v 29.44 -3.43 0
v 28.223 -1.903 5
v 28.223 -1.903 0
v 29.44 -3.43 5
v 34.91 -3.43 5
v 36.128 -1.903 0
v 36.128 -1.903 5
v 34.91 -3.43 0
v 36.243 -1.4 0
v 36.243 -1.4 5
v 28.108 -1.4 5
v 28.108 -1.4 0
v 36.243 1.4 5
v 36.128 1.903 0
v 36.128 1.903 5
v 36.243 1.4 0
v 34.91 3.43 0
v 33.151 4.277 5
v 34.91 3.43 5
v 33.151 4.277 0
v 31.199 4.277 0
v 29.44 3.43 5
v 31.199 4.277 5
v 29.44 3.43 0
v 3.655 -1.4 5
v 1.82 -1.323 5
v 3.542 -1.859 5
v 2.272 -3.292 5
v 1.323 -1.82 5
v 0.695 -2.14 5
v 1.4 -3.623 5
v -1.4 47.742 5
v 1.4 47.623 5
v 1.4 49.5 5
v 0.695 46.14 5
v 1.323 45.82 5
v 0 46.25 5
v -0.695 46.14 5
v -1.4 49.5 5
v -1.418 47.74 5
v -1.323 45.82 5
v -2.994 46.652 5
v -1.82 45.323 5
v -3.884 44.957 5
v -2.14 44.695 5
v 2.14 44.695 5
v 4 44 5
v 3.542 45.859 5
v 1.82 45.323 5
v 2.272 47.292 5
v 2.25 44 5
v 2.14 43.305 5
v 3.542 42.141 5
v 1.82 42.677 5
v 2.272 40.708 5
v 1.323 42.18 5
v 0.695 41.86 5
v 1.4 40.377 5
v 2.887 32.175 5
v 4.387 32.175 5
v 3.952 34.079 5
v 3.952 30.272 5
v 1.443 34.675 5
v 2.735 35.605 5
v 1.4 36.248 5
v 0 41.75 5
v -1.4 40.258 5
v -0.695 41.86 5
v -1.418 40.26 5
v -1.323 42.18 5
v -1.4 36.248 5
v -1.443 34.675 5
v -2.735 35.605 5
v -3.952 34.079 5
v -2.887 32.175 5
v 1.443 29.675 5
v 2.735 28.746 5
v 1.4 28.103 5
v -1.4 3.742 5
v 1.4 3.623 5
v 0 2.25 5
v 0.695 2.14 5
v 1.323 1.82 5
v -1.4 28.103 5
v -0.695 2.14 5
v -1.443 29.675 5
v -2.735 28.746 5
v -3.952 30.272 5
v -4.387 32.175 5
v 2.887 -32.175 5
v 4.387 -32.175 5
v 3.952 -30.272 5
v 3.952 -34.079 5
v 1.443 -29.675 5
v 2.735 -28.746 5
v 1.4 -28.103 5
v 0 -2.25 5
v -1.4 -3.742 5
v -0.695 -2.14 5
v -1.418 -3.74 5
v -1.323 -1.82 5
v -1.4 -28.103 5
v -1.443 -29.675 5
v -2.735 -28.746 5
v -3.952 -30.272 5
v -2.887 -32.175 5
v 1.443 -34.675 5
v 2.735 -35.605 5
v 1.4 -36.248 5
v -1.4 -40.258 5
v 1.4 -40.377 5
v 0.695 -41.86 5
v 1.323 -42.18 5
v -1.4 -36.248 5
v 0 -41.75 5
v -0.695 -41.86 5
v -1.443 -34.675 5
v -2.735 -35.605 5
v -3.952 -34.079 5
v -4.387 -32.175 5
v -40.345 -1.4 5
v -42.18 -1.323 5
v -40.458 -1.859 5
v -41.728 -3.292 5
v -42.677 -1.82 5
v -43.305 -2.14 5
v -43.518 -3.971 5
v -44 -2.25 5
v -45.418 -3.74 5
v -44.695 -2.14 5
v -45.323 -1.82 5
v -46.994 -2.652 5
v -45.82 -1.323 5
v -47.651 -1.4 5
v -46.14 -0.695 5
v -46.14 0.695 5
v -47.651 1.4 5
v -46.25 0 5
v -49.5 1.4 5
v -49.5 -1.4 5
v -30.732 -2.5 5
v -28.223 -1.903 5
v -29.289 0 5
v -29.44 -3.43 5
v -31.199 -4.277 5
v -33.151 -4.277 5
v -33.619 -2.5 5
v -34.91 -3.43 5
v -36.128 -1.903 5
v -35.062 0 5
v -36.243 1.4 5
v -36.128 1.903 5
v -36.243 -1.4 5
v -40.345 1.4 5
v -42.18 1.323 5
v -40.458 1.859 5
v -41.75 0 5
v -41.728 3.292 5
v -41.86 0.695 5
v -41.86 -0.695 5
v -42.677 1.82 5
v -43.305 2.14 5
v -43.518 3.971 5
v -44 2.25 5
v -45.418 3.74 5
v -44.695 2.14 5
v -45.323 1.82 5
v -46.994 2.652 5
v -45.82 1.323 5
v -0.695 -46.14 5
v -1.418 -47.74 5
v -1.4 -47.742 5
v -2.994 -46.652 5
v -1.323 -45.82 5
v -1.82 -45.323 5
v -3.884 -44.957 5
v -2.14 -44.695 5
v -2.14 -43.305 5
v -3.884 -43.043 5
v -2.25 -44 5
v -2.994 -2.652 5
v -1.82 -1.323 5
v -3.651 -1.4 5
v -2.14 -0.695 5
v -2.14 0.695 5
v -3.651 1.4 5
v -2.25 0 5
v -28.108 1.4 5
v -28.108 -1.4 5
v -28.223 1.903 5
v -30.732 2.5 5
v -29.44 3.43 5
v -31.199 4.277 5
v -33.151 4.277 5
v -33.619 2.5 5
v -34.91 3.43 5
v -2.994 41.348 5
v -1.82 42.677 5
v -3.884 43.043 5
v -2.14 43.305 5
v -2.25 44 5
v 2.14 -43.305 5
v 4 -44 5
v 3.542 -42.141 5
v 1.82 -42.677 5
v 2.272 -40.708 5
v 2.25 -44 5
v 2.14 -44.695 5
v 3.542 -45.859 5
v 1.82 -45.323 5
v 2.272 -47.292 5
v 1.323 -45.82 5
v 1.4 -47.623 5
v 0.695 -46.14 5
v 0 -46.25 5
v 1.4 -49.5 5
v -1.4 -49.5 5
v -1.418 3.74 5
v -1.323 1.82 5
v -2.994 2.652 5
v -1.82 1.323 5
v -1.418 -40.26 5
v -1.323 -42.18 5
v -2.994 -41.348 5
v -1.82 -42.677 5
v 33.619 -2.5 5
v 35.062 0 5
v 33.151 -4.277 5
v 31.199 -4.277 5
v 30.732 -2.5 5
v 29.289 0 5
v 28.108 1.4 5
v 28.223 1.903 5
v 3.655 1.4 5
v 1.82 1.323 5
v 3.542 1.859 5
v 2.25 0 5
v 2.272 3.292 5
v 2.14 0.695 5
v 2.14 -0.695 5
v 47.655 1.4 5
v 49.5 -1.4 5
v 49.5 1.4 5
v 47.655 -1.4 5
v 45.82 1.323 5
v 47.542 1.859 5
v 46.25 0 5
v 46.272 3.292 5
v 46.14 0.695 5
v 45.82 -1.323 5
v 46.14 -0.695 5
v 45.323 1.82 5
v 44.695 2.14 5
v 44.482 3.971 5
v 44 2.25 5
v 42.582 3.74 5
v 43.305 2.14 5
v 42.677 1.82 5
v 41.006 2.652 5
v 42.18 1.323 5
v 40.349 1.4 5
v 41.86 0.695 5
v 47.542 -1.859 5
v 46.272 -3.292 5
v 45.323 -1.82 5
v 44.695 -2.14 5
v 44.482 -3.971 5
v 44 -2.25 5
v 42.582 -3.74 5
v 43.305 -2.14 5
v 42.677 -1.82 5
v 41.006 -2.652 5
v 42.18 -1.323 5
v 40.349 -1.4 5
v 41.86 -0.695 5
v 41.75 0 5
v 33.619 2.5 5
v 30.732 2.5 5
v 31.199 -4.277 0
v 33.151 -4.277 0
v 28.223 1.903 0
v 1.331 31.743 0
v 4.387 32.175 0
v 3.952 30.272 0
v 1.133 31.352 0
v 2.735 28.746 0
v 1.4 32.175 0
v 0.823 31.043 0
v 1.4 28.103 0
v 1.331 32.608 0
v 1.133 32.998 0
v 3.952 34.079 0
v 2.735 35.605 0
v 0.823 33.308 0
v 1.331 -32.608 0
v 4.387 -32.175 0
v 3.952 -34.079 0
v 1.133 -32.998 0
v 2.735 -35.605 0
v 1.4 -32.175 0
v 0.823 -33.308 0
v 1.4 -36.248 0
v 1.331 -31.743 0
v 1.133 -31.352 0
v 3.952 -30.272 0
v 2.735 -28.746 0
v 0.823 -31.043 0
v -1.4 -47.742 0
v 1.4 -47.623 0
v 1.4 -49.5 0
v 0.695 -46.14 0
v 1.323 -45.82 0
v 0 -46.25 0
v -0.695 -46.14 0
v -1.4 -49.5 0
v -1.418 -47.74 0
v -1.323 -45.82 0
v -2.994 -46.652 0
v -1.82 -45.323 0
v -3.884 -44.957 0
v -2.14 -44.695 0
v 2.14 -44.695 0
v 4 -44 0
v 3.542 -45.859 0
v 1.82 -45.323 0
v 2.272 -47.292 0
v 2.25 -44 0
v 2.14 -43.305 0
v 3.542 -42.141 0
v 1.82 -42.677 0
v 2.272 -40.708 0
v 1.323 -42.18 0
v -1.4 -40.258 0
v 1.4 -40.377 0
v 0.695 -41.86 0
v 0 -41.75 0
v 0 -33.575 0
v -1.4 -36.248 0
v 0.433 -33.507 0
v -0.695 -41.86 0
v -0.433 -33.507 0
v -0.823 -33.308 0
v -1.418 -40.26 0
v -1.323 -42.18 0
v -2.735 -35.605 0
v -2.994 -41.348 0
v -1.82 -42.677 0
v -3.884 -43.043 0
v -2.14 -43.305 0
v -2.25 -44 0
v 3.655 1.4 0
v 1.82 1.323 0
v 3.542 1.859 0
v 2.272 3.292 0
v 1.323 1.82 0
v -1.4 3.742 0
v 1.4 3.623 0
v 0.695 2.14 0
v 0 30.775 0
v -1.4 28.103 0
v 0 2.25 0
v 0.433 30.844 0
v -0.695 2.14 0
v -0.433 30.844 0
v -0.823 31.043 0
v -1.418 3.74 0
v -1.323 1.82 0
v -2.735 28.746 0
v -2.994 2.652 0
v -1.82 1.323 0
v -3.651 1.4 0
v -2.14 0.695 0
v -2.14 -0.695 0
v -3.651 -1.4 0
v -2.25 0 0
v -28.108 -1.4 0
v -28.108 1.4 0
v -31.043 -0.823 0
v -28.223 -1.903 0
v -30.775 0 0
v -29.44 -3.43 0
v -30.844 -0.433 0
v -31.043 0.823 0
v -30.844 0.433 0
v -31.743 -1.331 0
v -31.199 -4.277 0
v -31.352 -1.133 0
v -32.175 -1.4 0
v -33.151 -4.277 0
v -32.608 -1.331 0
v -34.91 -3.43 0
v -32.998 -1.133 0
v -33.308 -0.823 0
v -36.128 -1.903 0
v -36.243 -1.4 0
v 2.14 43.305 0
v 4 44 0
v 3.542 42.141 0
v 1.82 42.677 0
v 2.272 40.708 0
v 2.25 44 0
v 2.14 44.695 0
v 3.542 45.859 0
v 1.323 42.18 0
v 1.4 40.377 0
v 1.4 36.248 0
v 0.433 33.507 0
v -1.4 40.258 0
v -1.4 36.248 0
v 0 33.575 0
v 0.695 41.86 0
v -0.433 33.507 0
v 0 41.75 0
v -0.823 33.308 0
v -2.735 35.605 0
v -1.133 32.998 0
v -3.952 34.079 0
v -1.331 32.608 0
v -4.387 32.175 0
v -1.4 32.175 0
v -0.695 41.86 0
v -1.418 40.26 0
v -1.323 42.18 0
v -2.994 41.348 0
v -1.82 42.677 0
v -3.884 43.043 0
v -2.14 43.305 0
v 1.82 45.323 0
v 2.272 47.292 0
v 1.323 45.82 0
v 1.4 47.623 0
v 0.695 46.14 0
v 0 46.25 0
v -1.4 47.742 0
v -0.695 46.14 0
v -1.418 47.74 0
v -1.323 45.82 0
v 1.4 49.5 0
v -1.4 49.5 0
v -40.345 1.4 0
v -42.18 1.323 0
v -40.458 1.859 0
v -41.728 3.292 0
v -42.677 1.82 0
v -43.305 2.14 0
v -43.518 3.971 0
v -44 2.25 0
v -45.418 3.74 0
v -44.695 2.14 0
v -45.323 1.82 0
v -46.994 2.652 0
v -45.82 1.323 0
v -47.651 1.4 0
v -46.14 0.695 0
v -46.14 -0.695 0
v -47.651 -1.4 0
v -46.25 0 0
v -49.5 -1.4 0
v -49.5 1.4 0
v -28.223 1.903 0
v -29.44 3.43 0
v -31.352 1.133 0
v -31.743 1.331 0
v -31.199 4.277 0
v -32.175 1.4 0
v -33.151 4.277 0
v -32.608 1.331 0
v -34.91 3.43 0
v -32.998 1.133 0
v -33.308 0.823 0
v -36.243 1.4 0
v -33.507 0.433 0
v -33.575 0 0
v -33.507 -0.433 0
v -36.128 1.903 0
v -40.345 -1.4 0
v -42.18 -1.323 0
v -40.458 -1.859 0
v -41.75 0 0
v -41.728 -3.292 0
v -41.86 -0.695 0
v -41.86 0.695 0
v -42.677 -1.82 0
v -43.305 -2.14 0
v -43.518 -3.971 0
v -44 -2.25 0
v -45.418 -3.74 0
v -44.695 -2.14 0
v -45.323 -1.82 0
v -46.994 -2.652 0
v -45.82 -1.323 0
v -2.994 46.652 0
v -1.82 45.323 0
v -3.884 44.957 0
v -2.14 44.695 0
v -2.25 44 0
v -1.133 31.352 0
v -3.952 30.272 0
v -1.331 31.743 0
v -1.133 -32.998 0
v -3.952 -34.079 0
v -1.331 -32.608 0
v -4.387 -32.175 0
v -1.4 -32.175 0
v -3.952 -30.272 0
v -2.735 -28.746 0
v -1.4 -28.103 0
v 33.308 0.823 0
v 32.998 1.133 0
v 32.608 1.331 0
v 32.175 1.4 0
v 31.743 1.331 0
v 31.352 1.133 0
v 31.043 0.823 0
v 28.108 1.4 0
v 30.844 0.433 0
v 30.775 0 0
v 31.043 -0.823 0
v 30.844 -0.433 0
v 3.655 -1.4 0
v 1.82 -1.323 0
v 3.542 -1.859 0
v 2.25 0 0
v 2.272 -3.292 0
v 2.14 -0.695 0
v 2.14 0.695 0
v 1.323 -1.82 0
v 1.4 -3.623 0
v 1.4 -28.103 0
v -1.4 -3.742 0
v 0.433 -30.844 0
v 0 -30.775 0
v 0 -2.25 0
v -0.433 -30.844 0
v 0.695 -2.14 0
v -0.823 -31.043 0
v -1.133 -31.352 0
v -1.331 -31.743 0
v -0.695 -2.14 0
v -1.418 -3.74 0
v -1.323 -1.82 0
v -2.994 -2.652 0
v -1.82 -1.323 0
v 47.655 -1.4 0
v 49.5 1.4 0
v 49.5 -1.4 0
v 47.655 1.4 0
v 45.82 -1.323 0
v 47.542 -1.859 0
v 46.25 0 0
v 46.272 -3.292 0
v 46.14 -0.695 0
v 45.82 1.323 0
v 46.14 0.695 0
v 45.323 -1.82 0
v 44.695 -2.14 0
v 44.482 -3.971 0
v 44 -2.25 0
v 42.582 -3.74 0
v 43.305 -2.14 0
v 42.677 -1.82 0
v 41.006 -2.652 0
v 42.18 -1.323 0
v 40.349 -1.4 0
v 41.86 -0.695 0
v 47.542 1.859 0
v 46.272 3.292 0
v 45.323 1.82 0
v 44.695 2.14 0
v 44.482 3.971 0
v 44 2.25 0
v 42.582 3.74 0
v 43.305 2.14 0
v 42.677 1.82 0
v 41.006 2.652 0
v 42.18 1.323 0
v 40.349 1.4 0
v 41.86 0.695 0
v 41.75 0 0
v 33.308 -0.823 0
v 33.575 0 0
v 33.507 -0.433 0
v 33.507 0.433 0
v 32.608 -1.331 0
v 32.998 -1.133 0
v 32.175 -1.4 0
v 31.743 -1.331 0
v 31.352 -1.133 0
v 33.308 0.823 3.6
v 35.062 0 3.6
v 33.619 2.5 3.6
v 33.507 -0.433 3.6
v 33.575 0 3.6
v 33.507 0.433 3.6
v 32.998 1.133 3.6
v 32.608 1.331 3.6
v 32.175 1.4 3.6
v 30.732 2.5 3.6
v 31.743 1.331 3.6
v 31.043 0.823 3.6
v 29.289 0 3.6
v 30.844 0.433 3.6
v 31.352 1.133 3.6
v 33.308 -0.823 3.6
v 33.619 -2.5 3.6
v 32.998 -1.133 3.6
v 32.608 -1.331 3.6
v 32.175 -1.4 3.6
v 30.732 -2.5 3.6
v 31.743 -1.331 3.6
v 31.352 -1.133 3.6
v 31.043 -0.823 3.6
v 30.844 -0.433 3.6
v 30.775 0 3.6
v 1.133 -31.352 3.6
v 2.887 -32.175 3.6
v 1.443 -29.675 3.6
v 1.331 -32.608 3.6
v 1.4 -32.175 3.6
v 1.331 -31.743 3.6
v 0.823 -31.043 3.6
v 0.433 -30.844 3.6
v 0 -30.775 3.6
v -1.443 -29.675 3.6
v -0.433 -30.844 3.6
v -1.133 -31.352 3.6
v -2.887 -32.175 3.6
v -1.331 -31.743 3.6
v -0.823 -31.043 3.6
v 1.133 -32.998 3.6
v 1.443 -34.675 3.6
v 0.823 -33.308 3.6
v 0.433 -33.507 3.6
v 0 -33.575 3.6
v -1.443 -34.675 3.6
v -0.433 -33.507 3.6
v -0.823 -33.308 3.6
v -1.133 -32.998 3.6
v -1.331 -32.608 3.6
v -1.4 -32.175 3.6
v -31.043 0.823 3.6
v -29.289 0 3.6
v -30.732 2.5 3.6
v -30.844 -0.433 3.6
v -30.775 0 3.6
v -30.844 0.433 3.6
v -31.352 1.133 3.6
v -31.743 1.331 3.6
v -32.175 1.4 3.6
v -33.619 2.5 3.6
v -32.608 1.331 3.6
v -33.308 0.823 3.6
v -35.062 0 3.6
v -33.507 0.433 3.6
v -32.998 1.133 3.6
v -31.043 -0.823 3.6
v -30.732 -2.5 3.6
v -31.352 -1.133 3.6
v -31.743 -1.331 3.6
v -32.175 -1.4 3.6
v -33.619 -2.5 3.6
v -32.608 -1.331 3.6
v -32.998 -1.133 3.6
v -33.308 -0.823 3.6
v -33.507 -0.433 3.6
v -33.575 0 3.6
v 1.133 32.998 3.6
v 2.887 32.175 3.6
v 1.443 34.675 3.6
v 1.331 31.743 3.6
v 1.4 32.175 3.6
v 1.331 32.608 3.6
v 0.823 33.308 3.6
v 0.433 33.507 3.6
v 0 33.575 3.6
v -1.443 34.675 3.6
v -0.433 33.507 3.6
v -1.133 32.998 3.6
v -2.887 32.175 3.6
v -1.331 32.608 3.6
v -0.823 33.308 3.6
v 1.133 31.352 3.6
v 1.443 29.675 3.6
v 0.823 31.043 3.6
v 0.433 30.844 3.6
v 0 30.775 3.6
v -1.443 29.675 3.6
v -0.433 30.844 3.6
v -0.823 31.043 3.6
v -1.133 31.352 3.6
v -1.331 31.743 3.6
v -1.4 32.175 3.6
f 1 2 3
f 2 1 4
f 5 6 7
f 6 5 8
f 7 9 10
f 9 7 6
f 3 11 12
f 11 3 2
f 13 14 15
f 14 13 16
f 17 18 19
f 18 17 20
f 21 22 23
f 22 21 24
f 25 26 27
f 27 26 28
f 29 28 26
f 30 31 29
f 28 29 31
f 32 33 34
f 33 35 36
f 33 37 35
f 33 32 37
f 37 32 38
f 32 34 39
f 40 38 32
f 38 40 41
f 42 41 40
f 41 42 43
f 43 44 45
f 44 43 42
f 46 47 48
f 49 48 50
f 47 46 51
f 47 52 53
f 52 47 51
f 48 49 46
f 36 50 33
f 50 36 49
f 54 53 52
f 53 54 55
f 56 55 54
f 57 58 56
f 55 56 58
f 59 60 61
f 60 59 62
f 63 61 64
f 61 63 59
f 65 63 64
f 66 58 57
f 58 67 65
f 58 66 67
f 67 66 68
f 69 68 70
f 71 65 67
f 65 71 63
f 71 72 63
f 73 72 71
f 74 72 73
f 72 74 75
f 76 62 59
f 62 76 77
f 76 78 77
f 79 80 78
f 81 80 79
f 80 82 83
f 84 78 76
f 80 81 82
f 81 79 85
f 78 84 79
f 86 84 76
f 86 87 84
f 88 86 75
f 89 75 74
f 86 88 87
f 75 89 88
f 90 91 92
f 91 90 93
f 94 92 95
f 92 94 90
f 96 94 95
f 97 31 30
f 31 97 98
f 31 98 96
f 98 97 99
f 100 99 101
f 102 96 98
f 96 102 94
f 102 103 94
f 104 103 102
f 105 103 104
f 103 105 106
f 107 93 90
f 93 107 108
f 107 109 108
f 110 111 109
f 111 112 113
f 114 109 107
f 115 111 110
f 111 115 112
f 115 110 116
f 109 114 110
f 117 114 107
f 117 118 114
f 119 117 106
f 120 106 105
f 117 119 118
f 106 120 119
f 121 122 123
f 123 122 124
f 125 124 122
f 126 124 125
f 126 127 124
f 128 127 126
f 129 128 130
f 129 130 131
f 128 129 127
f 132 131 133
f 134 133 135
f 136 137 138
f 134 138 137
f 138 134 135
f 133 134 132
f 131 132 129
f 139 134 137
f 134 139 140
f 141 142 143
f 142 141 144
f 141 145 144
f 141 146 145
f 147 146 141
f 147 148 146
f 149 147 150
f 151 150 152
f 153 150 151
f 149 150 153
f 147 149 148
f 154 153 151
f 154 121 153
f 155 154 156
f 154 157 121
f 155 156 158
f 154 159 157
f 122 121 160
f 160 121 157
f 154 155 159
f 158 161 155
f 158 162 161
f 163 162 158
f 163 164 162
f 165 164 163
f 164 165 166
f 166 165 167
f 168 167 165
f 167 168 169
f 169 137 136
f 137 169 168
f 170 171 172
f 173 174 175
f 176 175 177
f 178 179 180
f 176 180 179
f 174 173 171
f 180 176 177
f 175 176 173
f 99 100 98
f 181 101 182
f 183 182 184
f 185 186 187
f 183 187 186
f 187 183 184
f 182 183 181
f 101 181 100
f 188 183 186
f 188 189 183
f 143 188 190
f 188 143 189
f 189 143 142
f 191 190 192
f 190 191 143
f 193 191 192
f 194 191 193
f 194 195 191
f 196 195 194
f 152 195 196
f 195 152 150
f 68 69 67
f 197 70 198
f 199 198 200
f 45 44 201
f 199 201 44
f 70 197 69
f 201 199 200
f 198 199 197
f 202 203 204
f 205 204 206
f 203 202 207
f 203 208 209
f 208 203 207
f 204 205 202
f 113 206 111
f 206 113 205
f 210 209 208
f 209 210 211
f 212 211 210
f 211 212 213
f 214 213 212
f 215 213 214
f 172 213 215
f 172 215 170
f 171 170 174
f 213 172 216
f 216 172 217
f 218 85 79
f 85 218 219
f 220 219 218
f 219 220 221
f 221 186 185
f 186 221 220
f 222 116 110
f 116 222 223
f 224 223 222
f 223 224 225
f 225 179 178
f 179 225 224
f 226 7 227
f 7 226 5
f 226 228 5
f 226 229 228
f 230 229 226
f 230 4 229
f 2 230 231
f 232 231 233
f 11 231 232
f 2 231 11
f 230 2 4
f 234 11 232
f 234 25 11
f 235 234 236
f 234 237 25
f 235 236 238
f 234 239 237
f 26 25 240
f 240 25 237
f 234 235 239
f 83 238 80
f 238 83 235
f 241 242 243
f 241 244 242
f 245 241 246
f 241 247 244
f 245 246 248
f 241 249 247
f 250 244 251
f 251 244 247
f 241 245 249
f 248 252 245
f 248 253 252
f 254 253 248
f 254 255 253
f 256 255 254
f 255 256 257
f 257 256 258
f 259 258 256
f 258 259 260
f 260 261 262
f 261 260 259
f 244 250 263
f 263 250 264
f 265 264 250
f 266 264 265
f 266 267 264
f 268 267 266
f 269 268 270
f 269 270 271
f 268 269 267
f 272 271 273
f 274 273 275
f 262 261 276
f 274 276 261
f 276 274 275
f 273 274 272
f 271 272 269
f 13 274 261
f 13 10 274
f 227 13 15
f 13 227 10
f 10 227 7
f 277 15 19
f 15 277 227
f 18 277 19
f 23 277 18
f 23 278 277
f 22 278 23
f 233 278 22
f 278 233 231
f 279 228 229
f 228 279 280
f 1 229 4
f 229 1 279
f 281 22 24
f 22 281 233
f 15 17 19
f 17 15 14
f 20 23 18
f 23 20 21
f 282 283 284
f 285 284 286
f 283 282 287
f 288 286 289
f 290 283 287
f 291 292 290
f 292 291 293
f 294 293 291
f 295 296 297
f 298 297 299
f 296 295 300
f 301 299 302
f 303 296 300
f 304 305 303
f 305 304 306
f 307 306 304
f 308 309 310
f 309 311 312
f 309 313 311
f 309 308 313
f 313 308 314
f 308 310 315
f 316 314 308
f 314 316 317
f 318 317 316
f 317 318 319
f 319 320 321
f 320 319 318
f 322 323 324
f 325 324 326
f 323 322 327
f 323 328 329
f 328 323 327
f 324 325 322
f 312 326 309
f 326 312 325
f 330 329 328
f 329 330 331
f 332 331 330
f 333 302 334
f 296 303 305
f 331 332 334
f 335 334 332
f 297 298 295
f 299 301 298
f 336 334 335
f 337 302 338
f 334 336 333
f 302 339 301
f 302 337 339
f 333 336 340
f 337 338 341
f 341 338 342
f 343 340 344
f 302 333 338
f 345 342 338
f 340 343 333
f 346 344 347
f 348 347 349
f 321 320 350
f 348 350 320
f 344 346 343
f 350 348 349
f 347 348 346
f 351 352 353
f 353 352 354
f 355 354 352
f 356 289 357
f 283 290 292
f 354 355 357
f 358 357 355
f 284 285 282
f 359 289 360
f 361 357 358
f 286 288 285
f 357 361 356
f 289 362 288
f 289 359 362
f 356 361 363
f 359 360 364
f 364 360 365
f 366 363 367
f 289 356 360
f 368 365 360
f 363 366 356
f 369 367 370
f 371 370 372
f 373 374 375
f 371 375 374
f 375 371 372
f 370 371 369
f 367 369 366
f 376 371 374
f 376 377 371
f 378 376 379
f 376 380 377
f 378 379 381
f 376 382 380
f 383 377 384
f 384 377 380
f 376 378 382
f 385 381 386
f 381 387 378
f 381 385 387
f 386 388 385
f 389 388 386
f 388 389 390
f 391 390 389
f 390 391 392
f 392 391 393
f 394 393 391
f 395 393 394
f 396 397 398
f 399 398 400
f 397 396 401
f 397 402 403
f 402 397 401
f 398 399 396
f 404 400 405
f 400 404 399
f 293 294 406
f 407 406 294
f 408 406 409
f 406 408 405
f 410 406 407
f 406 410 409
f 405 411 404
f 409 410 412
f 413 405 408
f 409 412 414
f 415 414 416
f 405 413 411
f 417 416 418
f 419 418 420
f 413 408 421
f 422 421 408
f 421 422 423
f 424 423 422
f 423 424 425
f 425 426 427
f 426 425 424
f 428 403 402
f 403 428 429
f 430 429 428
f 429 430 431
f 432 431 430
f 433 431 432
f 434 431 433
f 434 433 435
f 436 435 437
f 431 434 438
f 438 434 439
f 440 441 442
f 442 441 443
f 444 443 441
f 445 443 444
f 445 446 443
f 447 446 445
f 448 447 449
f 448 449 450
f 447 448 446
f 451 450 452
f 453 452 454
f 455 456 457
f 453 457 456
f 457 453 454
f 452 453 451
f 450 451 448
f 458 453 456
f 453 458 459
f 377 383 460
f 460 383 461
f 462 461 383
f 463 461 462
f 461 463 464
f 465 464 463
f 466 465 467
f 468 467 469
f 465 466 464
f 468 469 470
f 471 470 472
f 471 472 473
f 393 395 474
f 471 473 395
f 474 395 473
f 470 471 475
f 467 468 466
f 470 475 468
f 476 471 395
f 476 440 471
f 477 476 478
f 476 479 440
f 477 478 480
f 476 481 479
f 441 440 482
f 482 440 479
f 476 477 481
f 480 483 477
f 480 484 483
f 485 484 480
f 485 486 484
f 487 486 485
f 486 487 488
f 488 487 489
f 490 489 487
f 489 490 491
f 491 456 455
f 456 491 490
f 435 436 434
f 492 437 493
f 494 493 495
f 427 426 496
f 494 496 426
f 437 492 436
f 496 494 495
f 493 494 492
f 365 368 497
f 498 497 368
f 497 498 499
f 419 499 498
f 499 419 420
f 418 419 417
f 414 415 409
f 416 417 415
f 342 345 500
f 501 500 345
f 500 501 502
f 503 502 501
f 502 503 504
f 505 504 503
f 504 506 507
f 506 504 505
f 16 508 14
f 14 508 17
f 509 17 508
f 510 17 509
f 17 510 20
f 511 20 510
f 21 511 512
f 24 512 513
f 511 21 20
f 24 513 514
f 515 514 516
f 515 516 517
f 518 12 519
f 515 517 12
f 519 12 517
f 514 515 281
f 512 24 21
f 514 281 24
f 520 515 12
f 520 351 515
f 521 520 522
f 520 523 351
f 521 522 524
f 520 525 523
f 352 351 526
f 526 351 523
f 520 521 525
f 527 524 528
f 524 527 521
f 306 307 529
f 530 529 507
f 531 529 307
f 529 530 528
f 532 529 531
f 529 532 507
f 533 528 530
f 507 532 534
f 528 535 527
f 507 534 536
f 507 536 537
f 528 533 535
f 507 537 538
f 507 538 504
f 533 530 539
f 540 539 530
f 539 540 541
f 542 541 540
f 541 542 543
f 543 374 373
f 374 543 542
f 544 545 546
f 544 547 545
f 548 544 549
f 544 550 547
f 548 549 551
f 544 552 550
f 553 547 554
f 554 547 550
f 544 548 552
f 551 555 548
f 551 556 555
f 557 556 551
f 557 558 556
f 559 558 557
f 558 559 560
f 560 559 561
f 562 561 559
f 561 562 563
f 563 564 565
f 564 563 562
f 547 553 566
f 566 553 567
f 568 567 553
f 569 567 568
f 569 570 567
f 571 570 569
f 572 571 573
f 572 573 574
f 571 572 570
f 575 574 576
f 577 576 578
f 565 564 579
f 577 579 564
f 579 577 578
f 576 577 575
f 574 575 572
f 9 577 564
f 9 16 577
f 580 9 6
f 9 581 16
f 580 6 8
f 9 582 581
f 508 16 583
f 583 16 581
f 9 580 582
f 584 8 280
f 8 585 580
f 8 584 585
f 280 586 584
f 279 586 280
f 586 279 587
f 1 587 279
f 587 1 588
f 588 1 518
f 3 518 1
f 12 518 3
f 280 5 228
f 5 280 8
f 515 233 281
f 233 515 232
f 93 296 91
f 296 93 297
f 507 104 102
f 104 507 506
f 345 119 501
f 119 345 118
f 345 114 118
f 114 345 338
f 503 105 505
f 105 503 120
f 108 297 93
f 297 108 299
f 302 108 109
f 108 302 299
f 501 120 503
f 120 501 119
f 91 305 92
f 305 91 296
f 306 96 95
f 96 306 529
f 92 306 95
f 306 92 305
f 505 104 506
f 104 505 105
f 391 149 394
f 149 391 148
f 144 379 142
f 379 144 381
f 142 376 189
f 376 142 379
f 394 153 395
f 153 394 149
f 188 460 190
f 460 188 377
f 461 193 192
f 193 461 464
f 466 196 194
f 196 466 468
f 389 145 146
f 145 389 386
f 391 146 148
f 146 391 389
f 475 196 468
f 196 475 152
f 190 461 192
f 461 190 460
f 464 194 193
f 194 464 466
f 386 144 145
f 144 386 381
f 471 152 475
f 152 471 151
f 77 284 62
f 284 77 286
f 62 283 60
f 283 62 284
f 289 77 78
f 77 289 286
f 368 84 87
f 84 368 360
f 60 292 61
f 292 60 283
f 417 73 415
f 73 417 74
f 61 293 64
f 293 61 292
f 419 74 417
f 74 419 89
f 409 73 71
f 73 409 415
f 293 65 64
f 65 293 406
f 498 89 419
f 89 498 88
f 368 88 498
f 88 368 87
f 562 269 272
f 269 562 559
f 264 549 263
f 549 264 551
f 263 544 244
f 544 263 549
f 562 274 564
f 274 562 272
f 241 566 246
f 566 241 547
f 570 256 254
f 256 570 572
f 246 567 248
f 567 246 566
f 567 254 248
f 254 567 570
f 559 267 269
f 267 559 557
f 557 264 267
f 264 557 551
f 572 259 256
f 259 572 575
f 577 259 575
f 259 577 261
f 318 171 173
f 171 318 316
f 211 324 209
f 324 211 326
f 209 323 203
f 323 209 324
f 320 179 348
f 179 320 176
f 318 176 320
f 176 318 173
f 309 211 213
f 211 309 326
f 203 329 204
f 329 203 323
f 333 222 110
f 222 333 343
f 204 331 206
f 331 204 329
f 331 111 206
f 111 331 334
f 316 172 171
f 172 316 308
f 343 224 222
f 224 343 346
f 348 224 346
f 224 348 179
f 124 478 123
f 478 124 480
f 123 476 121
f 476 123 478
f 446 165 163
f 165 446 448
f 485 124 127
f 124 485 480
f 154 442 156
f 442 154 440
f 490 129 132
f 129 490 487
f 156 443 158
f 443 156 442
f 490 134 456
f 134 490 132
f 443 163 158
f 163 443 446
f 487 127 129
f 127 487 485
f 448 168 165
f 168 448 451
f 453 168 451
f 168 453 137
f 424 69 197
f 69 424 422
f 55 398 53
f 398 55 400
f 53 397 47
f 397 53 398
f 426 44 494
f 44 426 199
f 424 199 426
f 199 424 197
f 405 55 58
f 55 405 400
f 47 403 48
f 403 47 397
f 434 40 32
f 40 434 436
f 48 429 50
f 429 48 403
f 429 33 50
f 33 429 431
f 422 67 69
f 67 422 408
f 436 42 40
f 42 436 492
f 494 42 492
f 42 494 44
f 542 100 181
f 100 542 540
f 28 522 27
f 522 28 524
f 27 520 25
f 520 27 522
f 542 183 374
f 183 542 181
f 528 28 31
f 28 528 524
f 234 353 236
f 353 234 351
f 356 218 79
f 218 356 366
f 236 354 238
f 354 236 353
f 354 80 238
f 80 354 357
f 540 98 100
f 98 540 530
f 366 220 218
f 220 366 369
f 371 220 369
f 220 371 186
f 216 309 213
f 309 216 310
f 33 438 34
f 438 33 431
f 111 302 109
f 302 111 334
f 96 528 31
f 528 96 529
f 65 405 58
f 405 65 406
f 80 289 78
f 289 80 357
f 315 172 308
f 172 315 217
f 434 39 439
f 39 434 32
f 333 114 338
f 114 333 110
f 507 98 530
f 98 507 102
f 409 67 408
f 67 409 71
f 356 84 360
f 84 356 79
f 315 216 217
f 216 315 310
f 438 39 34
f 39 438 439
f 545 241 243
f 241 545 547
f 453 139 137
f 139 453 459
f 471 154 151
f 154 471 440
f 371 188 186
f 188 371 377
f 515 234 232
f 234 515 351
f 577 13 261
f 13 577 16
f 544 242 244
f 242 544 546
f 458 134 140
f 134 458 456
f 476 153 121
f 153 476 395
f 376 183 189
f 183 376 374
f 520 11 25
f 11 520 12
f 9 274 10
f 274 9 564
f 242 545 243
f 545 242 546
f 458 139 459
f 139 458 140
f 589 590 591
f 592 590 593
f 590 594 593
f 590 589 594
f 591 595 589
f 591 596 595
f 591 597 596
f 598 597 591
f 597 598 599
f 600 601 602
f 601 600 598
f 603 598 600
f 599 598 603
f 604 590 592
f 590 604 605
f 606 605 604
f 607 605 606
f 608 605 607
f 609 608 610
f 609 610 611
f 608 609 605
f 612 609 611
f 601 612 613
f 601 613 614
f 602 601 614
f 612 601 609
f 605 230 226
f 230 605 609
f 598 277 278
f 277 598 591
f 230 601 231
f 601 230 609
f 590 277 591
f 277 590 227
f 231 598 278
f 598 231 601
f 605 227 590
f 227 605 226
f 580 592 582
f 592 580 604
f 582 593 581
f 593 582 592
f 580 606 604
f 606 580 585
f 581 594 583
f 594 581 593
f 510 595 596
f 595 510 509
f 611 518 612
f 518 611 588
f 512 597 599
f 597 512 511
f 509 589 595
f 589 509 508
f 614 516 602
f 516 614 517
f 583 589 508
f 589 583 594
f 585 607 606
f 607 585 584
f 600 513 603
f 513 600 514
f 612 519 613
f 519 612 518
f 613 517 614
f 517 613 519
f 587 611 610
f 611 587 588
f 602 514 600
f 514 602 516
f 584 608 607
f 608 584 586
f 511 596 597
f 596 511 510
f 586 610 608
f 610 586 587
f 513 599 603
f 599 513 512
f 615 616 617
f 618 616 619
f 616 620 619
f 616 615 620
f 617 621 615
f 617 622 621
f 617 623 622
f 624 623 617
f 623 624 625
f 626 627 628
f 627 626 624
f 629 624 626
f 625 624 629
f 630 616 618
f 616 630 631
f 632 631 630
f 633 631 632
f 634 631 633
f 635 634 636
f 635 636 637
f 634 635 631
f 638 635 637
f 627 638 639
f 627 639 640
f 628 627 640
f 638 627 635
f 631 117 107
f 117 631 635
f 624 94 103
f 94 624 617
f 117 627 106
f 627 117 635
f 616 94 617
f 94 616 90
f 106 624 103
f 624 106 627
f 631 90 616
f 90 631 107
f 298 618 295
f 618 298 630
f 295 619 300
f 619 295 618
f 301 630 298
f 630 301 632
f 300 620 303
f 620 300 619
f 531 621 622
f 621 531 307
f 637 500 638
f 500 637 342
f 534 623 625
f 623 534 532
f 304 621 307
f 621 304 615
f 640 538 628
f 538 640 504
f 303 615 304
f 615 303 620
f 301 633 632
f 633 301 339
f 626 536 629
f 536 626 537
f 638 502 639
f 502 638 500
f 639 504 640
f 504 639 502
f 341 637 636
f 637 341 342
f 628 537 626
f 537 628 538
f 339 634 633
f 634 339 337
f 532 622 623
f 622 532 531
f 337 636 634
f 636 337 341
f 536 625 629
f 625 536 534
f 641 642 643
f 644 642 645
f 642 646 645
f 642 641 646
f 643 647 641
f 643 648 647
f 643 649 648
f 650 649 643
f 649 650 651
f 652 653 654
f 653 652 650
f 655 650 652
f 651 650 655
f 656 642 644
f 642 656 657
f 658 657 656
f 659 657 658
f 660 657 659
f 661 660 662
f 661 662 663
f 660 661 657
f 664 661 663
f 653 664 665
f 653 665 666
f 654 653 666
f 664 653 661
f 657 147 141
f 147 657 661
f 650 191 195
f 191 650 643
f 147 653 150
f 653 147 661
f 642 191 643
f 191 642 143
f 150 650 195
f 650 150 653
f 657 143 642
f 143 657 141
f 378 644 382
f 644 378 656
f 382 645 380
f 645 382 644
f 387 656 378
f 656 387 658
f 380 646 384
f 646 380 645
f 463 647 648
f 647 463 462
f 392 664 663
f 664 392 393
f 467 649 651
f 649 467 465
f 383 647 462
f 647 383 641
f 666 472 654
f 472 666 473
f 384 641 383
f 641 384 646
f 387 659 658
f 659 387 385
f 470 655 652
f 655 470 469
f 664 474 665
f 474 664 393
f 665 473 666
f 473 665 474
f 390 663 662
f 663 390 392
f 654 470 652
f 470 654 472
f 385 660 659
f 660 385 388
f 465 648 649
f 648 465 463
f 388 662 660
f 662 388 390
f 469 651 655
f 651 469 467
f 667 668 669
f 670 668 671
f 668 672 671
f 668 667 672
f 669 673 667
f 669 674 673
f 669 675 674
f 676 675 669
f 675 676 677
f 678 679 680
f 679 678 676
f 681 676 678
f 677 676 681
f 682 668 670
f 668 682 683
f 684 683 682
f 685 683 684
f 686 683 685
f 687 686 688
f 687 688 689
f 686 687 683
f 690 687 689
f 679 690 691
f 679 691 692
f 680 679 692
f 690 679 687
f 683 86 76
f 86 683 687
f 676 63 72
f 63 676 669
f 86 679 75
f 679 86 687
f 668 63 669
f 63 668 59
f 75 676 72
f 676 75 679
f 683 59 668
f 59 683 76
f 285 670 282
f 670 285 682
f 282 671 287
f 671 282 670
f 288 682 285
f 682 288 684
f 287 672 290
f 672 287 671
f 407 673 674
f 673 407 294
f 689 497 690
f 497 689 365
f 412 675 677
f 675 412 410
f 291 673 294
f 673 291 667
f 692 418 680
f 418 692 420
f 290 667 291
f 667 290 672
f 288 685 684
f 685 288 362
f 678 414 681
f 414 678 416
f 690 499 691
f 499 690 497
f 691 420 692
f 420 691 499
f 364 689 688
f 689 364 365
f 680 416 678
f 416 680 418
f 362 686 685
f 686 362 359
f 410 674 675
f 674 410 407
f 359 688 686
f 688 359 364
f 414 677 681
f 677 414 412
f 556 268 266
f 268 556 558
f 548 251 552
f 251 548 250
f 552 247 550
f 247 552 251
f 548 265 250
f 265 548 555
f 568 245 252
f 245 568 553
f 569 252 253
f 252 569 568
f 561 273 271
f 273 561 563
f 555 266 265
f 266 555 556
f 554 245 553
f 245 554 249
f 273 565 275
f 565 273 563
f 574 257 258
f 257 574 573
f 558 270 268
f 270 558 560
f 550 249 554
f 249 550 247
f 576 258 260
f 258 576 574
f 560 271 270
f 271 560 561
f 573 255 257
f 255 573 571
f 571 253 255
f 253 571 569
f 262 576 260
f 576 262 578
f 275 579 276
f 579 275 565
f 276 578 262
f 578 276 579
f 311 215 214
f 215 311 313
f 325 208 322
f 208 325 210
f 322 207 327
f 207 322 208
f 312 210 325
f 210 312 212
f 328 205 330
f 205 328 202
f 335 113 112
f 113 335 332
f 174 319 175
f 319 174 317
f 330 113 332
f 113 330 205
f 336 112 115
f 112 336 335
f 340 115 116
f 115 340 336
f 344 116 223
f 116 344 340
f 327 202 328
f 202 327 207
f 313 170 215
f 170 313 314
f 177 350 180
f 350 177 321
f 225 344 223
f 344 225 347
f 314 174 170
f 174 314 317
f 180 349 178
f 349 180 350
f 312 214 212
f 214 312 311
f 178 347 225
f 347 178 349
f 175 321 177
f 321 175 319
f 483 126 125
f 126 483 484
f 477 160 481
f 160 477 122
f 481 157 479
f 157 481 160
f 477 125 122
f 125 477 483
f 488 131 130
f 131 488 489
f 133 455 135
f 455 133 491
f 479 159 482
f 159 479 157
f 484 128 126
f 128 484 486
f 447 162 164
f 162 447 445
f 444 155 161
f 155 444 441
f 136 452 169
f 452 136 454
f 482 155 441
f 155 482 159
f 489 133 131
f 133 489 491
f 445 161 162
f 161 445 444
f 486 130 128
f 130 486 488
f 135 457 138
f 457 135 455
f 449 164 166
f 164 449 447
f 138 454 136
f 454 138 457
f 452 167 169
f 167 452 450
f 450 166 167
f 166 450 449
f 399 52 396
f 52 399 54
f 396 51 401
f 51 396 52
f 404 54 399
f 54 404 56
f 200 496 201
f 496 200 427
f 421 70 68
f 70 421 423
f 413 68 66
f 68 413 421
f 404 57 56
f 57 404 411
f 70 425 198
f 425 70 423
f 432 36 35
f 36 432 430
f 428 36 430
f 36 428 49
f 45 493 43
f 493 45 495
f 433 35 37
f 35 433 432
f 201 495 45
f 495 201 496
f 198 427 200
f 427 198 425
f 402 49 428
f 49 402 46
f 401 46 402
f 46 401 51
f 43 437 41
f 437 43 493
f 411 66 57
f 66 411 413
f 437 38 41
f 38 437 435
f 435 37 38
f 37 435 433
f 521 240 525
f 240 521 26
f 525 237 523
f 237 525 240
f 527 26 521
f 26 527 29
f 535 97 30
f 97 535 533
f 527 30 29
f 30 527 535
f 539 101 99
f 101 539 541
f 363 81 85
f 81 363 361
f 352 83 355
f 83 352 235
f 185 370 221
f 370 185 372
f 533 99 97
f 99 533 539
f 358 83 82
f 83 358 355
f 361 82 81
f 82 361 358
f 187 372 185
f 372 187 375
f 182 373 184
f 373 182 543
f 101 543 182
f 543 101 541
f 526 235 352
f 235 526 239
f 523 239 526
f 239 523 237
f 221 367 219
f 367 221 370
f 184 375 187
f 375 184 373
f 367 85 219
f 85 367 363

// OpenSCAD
module
hexagon (d, height)
// D is the distance between two oppisite vertices on the hexagon
{
   D = d * 2 / sqrt(3);
   t = D / 2;
  
  for (r =[0, 60, 120])
    rotate ([0, 0, r]) cube ([t, d, height], true);
}


nutd = 5;
nutHeight = 2.8;

thickness = 5;
studDiameter = nutd * 2 / sqrt(3) + 3;
holeDiameter = 2.8;
braceWidth = holeDiameter;

mountDiameter = 8;
mountHoleDiameter = 4.5;



offsetX = 46;
offsetY = 45;

diagonalBoard= sqrt(pow(offsetX, 2) + pow(offsetY, 2));
diagonalBeam = 99;

//diagonalMount = diagonalBeam - (diagonalBeam - diagonalBoard) / 2;
diagonalMount = diagonalBeam - mountDiameter - 3;


//translateList = [
//                  [-offsetX / 2, -offsetY / 2, 0]
//                 ,[offsetX - offsetX / 2, -offsetY / 2, 0]
//                 ,[-offsetX / 2, offsetY - offsetY / 2, 0]
//                 ,[offsetX - offsetX / 2, offsetY - offsetY / 2, 0]
// 
//               ];
               

//translateList = [
//                  [diagonalBoard/ 2, 0, 0]
//                 ,[0, diagonalBoard/ 2, 0]
//                 ,[-diagonalBoard/ 2, 0]
//                 ,[0, -diagonalBoard/ 2, 0]
// 
//               ];
translateList = [
                  [1, 0, 0]
                 ,[0, 1, 0]
                 ,[-1, 0]
                 ,[0, -1, 0]
 
               ];
               
translateBoard = diagonalBoard/ 2 * translateList;
translateMount = concat(diagonalMount / 2 * translateList, [[0,0,0]]);

//translateList = translateList - [-offsetX / 2, -offsetY / 2, 0];
 
// Move to the center of the build plate 
//translate([100 - diagonal / 2, 100 - diagonal / 2, 0])

translate([0,0,thickness])
rotate(180, v=[1, 0, 0])

difference() {

union() {
   for (entry = translateBoard) {
      translate(entry)
      difference() {
         cylinder(d=studDiameter, h=thickness);
      }
   }
   
  for (entry = translateMount) {
      translate(entry)
      cylinder(d=mountDiameter, h=thickness);
   }

//   rotate(-45)
   translate([-braceWidth / 2, -diagonalBeam / 2, 0])
   cube([braceWidth, diagonalBeam, thickness]);

//   translate([0, -offsetY / 2, 0])
   rotate(-90)
   translate([-braceWidth / 2, -diagonalBeam / 2, 0])
   cube([braceWidth, diagonalBeam, thickness]);
};

for (entry = translateBoard) {
      translate(entry)
      union() {
         cylinder(d=holeDiameter, h=thickness, $fn=20);
         hexagon(nutd, nutHeight);
      }

      }
   
for (entry = translateMount) {
      translate(entry)
      cylinder(d=mountHoleDiameter, h=thickness, $fn=20);
   }
   
};
